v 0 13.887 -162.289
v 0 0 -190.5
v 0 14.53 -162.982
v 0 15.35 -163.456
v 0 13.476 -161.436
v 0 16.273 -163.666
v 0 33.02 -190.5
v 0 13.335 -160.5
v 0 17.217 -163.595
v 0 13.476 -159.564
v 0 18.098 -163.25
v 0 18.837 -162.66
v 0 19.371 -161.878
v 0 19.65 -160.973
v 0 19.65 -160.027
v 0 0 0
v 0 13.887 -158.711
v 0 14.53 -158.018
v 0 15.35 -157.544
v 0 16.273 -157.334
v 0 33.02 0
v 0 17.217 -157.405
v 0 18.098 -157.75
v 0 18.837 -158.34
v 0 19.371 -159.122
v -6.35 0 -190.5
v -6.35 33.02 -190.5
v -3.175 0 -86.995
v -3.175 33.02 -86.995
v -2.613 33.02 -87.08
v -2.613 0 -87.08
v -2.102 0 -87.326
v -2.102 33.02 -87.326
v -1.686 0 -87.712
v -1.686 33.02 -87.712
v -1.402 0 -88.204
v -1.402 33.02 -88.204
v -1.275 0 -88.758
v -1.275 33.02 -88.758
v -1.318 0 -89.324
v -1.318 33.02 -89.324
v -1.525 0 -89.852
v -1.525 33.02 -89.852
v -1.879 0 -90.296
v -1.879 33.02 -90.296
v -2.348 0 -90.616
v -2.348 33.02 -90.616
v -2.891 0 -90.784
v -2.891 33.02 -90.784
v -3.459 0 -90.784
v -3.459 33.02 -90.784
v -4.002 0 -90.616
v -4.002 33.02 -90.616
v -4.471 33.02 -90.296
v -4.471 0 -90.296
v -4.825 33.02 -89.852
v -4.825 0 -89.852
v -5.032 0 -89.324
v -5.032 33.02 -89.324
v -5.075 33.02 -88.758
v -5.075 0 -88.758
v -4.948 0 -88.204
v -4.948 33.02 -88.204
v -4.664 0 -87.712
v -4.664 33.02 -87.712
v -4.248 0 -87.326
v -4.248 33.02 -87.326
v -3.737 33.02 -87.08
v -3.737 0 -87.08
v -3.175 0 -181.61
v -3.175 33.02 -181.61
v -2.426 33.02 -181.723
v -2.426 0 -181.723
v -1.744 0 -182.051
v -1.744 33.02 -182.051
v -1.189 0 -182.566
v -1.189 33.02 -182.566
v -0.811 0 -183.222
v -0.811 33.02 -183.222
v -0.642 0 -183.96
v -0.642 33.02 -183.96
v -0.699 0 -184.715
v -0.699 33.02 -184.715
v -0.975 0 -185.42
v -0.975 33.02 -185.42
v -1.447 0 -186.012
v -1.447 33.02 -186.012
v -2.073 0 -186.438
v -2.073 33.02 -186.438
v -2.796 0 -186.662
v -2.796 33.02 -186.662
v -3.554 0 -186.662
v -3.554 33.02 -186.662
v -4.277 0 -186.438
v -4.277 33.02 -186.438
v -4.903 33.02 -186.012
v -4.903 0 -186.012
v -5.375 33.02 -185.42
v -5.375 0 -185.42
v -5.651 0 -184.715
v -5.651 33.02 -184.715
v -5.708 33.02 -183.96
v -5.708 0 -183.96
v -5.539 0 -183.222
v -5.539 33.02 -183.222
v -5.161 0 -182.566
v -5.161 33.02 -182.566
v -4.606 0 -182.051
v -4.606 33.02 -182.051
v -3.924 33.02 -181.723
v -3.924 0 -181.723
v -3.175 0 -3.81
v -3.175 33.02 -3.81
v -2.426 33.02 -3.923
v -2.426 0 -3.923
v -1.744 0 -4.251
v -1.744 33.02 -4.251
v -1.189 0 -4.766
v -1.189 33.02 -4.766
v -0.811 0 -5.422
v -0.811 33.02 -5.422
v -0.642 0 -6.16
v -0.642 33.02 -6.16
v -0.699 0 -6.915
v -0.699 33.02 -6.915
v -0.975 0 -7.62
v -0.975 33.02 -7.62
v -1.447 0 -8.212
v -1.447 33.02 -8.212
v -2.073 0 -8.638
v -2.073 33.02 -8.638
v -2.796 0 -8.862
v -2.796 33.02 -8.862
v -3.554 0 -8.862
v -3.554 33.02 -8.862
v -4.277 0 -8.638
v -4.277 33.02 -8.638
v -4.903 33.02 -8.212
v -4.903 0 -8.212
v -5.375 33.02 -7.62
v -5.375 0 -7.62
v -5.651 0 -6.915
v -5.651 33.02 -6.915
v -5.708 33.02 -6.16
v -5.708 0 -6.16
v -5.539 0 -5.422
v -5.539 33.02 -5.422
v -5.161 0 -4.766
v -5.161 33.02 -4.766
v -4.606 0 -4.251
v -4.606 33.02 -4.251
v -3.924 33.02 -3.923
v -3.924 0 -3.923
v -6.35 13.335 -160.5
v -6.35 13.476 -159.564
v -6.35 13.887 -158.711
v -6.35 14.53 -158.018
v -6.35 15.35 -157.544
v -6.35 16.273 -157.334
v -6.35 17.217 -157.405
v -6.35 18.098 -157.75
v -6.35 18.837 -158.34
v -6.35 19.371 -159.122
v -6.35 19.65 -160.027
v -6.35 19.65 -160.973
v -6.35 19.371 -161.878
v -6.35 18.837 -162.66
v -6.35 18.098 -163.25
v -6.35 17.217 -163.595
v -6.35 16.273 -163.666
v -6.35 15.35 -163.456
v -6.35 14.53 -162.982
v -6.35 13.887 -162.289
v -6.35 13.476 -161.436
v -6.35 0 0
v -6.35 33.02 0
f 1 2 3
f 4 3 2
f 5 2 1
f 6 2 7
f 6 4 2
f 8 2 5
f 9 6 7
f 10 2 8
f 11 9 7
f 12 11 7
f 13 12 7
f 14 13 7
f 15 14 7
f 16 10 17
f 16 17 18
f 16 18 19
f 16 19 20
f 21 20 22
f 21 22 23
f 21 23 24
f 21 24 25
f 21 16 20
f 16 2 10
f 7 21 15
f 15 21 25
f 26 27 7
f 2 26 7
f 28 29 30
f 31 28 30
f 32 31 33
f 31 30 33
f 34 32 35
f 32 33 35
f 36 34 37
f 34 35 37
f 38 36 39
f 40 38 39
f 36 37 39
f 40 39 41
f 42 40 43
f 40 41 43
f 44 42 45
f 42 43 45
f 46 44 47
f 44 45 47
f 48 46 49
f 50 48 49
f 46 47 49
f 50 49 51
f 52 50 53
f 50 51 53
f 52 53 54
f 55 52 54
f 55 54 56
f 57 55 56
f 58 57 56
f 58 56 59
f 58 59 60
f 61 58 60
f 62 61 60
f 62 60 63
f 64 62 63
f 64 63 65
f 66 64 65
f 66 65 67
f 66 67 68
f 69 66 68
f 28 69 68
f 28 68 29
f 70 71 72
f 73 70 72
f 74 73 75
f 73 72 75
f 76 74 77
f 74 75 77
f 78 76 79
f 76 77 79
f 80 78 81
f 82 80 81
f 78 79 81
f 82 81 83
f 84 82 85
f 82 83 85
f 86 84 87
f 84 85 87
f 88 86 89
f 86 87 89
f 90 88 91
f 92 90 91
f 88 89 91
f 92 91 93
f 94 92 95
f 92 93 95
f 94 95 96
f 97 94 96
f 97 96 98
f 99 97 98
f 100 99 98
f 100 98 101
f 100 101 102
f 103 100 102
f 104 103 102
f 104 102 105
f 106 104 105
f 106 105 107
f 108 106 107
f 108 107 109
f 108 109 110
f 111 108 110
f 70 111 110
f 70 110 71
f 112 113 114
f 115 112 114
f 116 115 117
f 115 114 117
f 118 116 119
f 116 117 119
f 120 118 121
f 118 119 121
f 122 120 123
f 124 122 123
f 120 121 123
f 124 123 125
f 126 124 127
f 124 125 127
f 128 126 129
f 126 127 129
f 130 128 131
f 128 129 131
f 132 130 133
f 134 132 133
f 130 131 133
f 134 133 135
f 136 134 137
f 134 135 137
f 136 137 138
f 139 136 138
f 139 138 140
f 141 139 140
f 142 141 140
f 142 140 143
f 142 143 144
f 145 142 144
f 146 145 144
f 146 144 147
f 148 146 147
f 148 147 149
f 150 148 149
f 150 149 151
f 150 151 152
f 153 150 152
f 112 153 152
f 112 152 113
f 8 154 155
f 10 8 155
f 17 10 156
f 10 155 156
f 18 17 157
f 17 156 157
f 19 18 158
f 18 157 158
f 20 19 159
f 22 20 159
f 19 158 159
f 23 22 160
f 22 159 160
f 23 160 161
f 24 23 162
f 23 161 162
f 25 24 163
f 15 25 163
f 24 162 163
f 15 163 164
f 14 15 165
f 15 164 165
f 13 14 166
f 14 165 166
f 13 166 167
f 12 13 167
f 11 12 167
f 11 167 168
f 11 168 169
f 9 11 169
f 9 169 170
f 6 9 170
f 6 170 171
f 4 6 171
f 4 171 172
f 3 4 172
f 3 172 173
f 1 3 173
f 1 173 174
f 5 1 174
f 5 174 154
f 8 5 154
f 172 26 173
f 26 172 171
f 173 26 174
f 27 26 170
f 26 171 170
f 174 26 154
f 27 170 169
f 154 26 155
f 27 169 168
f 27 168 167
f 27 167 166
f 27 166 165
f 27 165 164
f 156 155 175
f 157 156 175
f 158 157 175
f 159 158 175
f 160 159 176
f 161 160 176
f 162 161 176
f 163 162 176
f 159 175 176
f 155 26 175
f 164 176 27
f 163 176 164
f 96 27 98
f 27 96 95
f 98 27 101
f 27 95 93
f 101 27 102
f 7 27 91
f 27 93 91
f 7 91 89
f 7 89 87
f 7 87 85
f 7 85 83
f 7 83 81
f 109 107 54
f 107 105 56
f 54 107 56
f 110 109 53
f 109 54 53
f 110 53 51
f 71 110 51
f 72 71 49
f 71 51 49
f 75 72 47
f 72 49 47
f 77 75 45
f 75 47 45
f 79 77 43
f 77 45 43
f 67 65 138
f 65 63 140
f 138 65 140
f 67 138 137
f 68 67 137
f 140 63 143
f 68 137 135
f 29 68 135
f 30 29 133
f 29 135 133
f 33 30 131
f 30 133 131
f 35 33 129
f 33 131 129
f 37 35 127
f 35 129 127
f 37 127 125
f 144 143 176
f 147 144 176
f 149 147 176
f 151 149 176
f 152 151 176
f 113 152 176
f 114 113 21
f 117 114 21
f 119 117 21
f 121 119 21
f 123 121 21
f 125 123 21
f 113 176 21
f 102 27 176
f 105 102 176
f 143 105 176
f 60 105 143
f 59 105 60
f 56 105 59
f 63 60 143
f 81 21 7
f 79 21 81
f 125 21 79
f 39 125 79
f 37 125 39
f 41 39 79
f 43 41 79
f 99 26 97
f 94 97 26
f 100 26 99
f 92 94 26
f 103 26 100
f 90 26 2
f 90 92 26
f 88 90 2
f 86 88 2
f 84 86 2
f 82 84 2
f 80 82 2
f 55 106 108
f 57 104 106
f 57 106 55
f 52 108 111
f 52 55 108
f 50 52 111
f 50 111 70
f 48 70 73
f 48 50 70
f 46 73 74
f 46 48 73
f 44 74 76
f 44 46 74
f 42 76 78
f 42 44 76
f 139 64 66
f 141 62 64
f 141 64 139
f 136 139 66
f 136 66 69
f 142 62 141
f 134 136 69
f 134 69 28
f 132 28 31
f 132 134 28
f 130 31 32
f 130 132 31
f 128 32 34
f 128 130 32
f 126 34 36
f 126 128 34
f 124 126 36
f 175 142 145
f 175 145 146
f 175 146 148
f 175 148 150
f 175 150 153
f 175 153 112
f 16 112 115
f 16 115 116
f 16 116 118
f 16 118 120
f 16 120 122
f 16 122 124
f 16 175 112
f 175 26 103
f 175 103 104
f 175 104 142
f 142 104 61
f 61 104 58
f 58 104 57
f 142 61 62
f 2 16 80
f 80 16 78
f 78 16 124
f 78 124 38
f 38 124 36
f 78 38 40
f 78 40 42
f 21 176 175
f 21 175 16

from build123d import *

# Parameters (mm, degrees)
SKETCH1_W           = 6.35
SKETCH1_H           = 33.02
BOSS_EXTRUDE1_DEPTH = 190.5
CUT_EXTRUDE1_REACH  = 195.445
SKETCH2_R           = 3.175
SKETCH3_R           = 2.54
SKETCH3_R_2         = 1.905
CUT_EXTRUDE2_DEPTH  = 194.444805823


with BuildPart() as part:
    # Sketch1 → Boss-Extrude1 (new body)
    with BuildSketch(Plane.XY):
        with Locations((-3.175, 16.51)):
            Rectangle(SKETCH1_W, SKETCH1_H)
    extrude(amount=-BOSS_EXTRUDE1_DEPTH)

    # Sketch2 → Cut-Extrude1 (cut, up to next)
    with BuildSketch(Plane.ZY.offset(6.35), mode=Mode.PRIVATE) as cut_extrude1_sk1:
        with Locations(Location((-160.5000092, 16.51, 0), (0, 0, 270))):
            Circle(SKETCH2_R)
    cut_extrude1_tool1 = extrude(cut_extrude1_sk1.sketch, amount=-CUT_EXTRUDE1_REACH, mode=Mode.PRIVATE) & part.part
    add(cut_extrude1_tool1.solids().sort_by_distance((-6.35, 16.51, -160.500009))[0], mode=Mode.SUBTRACT)

    # Sketch3 → Cut-Extrude2 (cut, through all)
    with BuildSketch(Plane(origin=(0, 33.02, 0), x_dir=(1, 0, 0), z_dir=(0, 1, 0))):
        with Locations(Location((-3.175, 6.35, 0), (0, 0, 270))):
            Circle(SKETCH3_R)
        with Locations(Location((-3.175, 184.15, 0), (0, 0, 270))):
            Circle(SKETCH3_R)
        with Locations(Location((-3.175, 88.9, 0), (0, 0, 270))):
            Circle(SKETCH3_R_2)
    extrude(amount=-CUT_EXTRUDE2_DEPTH, mode=Mode.SUBTRACT)


solid = part.part
